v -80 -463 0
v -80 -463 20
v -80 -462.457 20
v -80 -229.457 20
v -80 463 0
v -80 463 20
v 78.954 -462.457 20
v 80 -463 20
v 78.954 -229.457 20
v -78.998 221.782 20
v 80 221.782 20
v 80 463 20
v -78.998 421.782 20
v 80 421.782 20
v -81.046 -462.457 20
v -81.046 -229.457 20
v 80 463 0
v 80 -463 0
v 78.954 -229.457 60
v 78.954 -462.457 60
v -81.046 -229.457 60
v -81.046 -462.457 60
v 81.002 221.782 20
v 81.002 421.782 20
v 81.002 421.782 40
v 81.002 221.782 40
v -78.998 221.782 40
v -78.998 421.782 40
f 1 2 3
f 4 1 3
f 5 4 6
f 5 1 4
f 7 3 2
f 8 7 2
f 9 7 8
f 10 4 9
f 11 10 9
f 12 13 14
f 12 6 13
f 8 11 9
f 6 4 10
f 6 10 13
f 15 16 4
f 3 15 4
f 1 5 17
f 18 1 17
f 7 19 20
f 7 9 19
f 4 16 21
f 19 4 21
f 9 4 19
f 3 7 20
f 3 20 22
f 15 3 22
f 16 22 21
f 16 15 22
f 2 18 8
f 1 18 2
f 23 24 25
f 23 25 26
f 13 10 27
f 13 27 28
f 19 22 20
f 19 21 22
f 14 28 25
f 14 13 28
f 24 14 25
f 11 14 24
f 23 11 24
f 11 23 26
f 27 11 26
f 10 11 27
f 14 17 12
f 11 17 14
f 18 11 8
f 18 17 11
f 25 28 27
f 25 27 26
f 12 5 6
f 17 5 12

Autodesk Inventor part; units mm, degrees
ref_plane "YZ Plane" through (0, 0, 0) normal (1, 0, 0) x (0, 1, 0)
ref_plane "XZ Plane" through (0, 0, 0) normal (0, 1, 0) x (-1, 0, 0)
sketch "Sketch1" plane through (0, 0, 0) normal (0, 0, 1) x (1, 0, 0)
  line L0 (-80, 463) -> (80, 463)
  line L1 (80, 463) -> (80, -463)
  line L2 (80, -463) -> (-80, -463)
  line L3 (-80, -463) -> (-80, 463)
  line L4 (0, 144.4625) -> (0, -193.675)
  line L5 (-174.625, 0) -> (185.7375, 0)
  point P0 (0, 0)
  dimension "d0" = 160
  dimension "d1" = 926
extrude "Extrusion1" add sketch "Sketch1" along normal blind 20
ref_plane "Work Plane1" through (0, 0, 20) normal (0, 0, 1) x (1, 0, 0)
sketch "Sketch2" plane through (0, 0, 20) normal (0, 0, 1) x (1, 0, 0)
  line L0 (-78.9983, 421.7822) -> (81.0017, 421.7822)
  line L1 (81.0017, 421.7822) -> (81.0017, 221.7822)
  line L2 (81.0017, 221.7822) -> (-78.9983, 221.7822)
  line L3 (-78.9983, 221.7822) -> (-78.9983, 421.7822)
  point P0 (0, 0)
  dimension "d5" = 200
  dimension "d6" = 160
extrude "Extrusion2" add sketch "Sketch2" along normal blind 20
sketch "Sketch3" plane through (0, 0, 20) normal (0, 0, 1) x (1, 0, 0)
  line L0 (-81.0461, -229.4574) -> (78.9539, -229.4574)
  line L1 (78.9539, -229.4574) -> (78.9539, -462.4574)
  line L2 (78.9539, -462.4574) -> (-81.0461, -462.4574)
  line L3 (-81.0461, -462.4574) -> (-81.0461, -229.4574)
  point P0 (0, 0)
  dimension "d9" = 233
  dimension "d10" = 160
extrude "Extrusion3" add sketch "Sketch3" along normal blind 40
properties part number "USW16T"
